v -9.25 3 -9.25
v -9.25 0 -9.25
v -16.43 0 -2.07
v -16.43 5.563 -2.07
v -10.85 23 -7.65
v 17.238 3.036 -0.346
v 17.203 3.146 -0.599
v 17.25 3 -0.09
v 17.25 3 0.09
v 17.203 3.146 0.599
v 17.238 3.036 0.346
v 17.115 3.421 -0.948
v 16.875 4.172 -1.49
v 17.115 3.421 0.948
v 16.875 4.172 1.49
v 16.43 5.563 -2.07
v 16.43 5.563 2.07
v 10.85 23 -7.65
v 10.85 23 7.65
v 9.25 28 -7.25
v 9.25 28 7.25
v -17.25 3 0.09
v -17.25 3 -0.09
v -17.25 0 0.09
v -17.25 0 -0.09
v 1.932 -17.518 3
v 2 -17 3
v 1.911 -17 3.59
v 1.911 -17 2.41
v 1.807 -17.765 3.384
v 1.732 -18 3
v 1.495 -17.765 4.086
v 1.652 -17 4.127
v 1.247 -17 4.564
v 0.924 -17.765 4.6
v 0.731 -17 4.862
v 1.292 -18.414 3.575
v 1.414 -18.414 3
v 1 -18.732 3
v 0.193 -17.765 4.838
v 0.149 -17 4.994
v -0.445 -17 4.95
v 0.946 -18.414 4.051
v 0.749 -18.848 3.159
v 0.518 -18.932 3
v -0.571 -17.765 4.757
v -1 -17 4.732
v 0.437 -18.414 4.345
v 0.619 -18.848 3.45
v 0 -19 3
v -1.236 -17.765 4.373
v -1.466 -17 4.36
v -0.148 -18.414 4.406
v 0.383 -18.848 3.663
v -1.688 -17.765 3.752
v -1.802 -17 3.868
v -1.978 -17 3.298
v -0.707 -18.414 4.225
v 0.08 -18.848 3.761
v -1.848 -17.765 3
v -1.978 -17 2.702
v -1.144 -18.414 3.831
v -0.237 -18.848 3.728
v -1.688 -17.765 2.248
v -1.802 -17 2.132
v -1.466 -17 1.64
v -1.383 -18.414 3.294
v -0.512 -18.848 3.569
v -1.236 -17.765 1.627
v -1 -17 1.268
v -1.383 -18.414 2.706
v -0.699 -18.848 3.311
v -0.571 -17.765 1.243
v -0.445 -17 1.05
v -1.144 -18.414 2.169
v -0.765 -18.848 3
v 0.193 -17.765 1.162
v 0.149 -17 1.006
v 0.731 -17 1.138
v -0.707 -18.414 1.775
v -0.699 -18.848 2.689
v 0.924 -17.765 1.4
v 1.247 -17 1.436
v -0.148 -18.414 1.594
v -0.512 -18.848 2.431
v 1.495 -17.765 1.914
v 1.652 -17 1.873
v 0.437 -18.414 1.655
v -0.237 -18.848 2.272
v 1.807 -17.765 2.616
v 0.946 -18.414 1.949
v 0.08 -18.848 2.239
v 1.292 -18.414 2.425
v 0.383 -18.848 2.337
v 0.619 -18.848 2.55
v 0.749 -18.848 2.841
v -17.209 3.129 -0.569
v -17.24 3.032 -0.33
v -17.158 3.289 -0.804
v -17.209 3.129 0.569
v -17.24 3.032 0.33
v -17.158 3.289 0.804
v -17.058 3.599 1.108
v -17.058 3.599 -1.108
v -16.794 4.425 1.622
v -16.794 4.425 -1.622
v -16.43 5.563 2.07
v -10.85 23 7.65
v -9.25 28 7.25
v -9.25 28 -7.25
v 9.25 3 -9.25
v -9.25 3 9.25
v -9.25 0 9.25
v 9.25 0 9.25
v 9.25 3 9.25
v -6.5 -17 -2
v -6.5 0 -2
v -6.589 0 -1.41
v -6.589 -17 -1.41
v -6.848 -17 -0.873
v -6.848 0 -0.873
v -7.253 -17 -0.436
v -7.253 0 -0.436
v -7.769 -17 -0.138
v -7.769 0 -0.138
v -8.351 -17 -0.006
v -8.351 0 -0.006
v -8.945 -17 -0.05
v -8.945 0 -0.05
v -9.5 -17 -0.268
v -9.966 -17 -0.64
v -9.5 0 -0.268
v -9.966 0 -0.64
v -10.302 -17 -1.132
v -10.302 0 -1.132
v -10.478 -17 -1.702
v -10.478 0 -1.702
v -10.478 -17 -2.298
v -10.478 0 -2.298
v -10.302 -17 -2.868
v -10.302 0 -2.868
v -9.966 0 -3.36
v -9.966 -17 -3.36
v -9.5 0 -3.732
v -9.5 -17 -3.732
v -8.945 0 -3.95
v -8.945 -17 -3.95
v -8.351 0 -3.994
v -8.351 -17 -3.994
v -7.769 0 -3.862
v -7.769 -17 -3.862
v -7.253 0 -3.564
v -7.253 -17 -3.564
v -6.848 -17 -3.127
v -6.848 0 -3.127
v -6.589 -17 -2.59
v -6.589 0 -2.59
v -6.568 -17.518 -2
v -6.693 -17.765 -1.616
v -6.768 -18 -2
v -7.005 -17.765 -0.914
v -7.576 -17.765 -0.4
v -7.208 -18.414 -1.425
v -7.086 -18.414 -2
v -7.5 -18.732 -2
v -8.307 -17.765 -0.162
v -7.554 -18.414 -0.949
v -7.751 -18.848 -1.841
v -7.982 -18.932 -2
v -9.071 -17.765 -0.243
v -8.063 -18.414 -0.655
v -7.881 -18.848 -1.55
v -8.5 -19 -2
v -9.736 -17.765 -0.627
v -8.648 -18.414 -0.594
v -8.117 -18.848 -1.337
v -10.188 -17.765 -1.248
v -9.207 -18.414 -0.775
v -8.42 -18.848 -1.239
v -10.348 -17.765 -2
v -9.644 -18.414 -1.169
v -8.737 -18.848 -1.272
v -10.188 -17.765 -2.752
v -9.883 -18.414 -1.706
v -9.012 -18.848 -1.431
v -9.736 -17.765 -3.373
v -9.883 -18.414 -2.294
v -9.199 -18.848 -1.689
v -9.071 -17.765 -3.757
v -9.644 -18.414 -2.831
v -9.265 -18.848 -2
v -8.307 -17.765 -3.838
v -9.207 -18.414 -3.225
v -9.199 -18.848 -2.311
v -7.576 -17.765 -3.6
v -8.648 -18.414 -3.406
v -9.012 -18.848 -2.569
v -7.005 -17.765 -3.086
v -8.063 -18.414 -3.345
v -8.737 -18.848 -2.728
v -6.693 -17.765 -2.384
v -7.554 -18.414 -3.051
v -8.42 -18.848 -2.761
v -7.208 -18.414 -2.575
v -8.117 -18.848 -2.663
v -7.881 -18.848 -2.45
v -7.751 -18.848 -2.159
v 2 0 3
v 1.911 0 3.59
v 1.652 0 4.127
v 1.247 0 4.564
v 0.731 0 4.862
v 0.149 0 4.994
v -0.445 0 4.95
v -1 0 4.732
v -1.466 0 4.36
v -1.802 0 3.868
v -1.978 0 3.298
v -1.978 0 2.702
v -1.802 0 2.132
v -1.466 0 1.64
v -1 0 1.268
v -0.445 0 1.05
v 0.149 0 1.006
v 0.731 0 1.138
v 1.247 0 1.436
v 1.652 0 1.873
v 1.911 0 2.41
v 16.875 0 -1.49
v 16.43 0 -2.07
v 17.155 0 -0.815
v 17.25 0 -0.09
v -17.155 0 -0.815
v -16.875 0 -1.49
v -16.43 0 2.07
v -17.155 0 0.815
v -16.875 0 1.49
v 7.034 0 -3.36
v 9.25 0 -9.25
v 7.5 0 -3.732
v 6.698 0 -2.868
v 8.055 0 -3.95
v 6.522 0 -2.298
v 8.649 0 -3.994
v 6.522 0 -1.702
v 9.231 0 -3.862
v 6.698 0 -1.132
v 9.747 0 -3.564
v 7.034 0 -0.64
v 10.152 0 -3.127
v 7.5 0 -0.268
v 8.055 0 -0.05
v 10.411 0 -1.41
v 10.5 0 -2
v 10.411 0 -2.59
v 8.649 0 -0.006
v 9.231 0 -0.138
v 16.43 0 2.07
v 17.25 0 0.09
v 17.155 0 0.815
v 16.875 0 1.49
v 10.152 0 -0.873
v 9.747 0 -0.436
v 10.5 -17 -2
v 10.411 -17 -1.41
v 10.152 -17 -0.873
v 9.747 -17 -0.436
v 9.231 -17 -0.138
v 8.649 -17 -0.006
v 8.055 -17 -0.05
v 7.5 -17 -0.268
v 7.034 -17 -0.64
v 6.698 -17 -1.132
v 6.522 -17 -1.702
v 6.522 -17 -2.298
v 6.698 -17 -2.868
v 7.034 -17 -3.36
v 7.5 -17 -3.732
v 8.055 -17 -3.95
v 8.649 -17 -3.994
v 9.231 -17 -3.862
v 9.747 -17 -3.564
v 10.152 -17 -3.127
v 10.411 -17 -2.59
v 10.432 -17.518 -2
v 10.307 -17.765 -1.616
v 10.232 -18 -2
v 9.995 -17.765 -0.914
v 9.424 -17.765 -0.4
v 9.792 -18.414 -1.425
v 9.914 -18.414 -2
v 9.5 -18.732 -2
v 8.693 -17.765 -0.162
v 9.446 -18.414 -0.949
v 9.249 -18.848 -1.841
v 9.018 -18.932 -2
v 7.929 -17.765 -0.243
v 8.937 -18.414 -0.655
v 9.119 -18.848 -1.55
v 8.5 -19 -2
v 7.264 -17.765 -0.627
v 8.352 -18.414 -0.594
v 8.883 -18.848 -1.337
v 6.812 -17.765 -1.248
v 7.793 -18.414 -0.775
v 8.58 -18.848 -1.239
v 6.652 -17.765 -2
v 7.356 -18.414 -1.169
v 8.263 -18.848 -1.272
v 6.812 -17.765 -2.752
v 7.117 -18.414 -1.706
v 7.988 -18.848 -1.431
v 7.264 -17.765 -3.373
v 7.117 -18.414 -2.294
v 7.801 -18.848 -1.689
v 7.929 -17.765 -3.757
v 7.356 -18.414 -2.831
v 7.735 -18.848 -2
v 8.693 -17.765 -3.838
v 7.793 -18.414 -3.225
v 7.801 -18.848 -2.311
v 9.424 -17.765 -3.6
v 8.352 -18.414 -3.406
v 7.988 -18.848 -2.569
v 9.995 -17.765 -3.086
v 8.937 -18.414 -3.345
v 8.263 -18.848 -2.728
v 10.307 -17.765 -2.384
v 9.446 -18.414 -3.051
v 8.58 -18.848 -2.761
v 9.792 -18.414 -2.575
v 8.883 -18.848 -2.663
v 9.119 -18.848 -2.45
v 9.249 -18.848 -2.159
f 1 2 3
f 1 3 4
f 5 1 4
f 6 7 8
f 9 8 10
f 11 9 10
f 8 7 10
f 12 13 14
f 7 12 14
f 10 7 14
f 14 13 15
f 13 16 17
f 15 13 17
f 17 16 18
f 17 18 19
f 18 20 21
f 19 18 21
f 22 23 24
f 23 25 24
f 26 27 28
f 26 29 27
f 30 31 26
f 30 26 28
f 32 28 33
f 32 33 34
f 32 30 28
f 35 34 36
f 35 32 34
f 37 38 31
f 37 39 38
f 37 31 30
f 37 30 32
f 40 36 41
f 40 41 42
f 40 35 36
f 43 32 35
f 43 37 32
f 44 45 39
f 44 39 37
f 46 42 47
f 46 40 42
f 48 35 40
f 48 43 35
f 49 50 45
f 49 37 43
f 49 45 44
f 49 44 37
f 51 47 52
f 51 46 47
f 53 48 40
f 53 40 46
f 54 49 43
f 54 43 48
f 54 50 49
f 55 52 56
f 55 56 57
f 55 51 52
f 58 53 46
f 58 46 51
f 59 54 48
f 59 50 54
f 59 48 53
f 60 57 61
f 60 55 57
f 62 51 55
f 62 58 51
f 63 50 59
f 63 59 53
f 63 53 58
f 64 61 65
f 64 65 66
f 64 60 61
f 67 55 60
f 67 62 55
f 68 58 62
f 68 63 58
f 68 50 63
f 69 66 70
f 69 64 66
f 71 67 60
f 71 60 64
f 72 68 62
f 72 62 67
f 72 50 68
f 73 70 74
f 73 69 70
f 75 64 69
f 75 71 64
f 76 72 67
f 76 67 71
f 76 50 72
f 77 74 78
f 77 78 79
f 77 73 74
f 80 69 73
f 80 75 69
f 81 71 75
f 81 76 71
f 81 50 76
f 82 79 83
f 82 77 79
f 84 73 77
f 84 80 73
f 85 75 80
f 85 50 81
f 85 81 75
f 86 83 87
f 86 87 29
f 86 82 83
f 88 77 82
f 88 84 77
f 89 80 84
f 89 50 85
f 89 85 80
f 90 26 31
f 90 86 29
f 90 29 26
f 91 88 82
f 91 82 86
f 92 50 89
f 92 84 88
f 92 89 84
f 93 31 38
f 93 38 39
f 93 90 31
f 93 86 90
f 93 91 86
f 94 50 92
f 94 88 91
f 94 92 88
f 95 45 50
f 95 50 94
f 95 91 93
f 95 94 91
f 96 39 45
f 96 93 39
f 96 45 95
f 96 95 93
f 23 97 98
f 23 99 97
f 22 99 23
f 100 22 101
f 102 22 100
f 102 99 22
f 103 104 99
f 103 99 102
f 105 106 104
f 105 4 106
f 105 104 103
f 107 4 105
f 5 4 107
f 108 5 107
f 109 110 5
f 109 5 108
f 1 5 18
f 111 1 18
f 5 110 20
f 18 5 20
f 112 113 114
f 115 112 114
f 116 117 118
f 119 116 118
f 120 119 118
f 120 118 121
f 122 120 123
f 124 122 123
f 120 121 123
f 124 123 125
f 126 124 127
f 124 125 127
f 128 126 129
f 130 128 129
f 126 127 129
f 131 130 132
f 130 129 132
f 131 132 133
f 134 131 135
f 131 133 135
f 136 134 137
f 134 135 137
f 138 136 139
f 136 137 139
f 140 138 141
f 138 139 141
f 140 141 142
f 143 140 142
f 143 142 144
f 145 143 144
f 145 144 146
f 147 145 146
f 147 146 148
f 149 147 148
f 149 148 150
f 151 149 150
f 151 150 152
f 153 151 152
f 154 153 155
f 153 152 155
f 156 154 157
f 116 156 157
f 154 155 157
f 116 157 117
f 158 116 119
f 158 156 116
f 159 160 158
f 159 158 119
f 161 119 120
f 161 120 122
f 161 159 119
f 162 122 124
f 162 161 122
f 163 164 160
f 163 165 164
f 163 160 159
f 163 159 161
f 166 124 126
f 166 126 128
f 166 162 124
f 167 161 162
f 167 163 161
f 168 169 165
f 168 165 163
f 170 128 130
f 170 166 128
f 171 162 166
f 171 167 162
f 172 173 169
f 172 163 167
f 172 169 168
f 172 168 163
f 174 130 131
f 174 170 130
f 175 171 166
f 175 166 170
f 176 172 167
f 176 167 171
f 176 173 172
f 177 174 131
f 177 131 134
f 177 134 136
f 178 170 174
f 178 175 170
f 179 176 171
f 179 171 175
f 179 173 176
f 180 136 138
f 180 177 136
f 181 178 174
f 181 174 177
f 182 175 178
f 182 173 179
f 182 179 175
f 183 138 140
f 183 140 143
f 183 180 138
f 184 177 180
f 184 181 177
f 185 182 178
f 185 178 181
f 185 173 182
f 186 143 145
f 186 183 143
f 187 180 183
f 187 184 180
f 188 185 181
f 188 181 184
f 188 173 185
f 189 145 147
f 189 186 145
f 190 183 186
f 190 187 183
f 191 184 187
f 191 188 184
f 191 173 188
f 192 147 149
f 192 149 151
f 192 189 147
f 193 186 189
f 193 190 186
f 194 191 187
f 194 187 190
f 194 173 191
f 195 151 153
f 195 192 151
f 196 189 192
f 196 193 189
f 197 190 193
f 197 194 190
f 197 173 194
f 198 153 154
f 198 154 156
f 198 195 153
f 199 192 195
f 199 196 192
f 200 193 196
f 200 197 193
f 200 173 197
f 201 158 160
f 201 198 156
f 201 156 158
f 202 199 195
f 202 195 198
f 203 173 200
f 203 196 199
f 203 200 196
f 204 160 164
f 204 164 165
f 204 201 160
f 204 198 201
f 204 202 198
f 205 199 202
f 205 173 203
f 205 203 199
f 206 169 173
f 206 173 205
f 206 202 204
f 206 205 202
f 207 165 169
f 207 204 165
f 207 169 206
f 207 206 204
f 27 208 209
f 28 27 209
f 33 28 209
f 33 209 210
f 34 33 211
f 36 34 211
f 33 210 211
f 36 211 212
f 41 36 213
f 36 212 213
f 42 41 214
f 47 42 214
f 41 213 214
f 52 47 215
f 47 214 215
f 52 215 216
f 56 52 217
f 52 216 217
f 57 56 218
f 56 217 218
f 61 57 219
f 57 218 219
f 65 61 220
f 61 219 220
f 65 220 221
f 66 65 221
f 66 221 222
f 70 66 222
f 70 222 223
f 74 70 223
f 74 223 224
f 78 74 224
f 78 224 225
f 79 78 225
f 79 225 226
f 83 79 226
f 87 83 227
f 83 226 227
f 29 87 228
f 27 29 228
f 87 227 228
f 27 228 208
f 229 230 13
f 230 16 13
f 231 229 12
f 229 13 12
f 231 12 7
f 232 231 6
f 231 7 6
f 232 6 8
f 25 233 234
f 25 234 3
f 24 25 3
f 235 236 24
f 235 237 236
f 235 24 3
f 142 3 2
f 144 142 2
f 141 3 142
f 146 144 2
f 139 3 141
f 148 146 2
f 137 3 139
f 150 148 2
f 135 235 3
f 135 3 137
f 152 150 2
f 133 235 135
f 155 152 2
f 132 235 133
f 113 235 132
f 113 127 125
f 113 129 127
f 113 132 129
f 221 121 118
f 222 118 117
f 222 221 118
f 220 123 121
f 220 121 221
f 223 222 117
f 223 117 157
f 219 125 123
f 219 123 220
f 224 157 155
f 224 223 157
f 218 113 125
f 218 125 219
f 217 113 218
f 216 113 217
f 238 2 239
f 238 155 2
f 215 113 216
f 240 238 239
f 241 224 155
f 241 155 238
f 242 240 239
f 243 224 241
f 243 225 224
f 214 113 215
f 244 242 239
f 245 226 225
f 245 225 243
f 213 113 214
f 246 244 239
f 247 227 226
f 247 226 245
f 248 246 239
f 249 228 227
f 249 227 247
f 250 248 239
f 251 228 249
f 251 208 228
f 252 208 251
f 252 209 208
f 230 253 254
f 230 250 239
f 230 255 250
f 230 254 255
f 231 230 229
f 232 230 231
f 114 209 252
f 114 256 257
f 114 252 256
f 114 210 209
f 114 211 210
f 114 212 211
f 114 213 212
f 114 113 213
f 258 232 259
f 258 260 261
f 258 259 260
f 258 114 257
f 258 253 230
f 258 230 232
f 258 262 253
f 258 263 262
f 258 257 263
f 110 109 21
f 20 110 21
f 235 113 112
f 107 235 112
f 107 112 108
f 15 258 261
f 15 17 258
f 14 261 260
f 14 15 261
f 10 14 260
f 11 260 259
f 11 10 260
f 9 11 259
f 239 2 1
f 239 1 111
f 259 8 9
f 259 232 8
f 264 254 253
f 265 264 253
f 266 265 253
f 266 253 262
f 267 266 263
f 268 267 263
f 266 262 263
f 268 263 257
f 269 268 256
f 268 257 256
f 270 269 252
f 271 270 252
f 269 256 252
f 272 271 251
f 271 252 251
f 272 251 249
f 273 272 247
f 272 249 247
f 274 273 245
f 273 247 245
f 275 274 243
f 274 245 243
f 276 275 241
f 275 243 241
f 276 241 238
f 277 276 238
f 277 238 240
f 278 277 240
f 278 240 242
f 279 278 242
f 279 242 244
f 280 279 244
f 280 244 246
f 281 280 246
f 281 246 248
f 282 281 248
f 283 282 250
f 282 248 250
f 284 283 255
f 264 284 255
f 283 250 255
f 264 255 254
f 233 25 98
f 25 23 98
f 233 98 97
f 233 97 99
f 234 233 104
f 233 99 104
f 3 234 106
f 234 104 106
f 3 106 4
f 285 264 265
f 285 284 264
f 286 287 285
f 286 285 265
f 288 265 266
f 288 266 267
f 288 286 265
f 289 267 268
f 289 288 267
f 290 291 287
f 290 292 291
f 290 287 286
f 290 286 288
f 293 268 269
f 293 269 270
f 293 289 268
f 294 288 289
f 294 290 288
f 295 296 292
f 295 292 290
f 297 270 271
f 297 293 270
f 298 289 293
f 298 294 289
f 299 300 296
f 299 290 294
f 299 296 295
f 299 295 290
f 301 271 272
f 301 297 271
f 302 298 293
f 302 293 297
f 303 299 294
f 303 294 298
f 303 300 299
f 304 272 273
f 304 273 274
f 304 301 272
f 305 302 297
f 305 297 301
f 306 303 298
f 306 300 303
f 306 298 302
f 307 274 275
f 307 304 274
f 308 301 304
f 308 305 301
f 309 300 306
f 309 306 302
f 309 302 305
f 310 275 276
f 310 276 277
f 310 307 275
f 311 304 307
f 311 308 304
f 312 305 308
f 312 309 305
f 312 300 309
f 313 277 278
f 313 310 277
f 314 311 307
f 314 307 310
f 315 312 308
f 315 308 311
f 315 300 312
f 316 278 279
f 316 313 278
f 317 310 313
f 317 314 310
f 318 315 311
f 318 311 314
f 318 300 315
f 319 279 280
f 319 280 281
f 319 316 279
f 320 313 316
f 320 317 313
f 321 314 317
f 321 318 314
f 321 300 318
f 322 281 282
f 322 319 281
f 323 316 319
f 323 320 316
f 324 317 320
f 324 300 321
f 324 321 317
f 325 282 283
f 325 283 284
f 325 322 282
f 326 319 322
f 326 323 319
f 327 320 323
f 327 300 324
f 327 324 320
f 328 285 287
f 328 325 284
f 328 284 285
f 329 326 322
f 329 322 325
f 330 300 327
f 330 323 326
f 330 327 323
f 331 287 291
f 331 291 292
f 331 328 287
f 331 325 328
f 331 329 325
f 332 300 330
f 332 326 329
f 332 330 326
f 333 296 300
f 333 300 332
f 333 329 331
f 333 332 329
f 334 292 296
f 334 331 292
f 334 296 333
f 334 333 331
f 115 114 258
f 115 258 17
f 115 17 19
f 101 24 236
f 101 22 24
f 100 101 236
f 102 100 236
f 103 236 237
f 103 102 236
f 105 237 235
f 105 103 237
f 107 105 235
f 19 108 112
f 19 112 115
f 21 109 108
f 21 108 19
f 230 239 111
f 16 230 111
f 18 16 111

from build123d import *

# Parameters (mm, degrees)
F0_W       = 34.5
F0_H       = 18.5
F1_DEPTH   = 28
F2_R       = 2
F3_DEPTH   = 19
F4_SIZE    = 8
F5_SIZE2   = 8
F5_SIZE    = 25
F5_2_SIZE2 = 8
F5_2_SIZE  = 25
F6_SIZE2   = 2
F6_SIZE    = 25
F6_2_SIZE2 = 2
F6_2_SIZE  = 25
F7_R       = 2
F8_R       = 2.8


with BuildPart() as f1:
    # F0 (on Front) → F1 (new body)
    with BuildSketch(Plane.XZ):
        Rectangle(F0_W, F0_H)
    extrude(amount=-F1_DEPTH)

    # F2 (on face) → F3 (join)
    with BuildSketch(Plane.XZ):
        with Locations((-8.5, -2)):
            Circle(F2_R)
        with Locations((8.5, -2)):
            Circle(F2_R)
        with Locations((0, 3)):
            Circle(F2_R)
    extrude(amount=F3_DEPTH)

    # F4
    f4_edges = [f1.edges().sort_by_distance(p)[0] for p in [
        (17.25, 14, 9.25),
        (-17.25, 14, 9.25),
        (17.25, 14, -9.25),
        (-17.25, 14, -9.25),
    ]]
    chamfer(f4_edges, length=F4_SIZE)

    # F5
    f5_edges = [f1.edges().sort_by_distance(p)[0] for p in [
        (17.25, 28, 0),
    ]]
    f5_side = f1.faces().sort_by_distance((17.25, 14, 0))[0]
    chamfer(f5_edges, length=F5_SIZE, length2=F5_SIZE2, reference=f5_side)

    # F5#2
    f5_2_edges = [f1.edges().sort_by_distance(p)[0] for p in [
        (-17.25, 28, 0),
    ]]
    f5_2_side = f1.faces().sort_by_distance((-17.25, 14, 0))[0]
    chamfer(f5_2_edges, length=F5_2_SIZE, length2=F5_2_SIZE2, reference=f5_2_side)

    # F6
    f6_edges = [f1.edges().sort_by_distance(p)[0] for p in [
        (0, 28, 9.25),
    ]]
    f6_side = f1.faces().sort_by_distance((0, 14, 9.25))[0]
    chamfer(f6_edges, length=F6_SIZE, length2=F6_SIZE2, reference=f6_side)

    # F6#2
    f6_2_edges = [f1.edges().sort_by_distance(p)[0] for p in [
        (0, 28, -9.25),
    ]]
    f6_2_side = f1.faces().sort_by_distance((0, 14, -9.25))[0]
    chamfer(f6_2_edges, length=F6_2_SIZE, length2=F6_2_SIZE2, reference=f6_2_side)

    # F7
    f7_edges = [f1.edges().sort_by_distance(p)[0] for p in [
        (-10.5, -19, -2),
        (6.5, -19, -2),
        (-2, -19, 3),
    ]]
    fillet(f7_edges, radius=F7_R)

    # F8
    f8_edges = [f1.edges().sort_by_distance(p)[0] for p in [
        (-17.25, 1.5, 1.25),
        (-17.25, 1.5, -1.25),
        (17.25, 1.5, 1.25),
        (17.25, 1.5, -1.25),
    ]]
    fillet(f8_edges, radius=F8_R)


solid = f1.part
